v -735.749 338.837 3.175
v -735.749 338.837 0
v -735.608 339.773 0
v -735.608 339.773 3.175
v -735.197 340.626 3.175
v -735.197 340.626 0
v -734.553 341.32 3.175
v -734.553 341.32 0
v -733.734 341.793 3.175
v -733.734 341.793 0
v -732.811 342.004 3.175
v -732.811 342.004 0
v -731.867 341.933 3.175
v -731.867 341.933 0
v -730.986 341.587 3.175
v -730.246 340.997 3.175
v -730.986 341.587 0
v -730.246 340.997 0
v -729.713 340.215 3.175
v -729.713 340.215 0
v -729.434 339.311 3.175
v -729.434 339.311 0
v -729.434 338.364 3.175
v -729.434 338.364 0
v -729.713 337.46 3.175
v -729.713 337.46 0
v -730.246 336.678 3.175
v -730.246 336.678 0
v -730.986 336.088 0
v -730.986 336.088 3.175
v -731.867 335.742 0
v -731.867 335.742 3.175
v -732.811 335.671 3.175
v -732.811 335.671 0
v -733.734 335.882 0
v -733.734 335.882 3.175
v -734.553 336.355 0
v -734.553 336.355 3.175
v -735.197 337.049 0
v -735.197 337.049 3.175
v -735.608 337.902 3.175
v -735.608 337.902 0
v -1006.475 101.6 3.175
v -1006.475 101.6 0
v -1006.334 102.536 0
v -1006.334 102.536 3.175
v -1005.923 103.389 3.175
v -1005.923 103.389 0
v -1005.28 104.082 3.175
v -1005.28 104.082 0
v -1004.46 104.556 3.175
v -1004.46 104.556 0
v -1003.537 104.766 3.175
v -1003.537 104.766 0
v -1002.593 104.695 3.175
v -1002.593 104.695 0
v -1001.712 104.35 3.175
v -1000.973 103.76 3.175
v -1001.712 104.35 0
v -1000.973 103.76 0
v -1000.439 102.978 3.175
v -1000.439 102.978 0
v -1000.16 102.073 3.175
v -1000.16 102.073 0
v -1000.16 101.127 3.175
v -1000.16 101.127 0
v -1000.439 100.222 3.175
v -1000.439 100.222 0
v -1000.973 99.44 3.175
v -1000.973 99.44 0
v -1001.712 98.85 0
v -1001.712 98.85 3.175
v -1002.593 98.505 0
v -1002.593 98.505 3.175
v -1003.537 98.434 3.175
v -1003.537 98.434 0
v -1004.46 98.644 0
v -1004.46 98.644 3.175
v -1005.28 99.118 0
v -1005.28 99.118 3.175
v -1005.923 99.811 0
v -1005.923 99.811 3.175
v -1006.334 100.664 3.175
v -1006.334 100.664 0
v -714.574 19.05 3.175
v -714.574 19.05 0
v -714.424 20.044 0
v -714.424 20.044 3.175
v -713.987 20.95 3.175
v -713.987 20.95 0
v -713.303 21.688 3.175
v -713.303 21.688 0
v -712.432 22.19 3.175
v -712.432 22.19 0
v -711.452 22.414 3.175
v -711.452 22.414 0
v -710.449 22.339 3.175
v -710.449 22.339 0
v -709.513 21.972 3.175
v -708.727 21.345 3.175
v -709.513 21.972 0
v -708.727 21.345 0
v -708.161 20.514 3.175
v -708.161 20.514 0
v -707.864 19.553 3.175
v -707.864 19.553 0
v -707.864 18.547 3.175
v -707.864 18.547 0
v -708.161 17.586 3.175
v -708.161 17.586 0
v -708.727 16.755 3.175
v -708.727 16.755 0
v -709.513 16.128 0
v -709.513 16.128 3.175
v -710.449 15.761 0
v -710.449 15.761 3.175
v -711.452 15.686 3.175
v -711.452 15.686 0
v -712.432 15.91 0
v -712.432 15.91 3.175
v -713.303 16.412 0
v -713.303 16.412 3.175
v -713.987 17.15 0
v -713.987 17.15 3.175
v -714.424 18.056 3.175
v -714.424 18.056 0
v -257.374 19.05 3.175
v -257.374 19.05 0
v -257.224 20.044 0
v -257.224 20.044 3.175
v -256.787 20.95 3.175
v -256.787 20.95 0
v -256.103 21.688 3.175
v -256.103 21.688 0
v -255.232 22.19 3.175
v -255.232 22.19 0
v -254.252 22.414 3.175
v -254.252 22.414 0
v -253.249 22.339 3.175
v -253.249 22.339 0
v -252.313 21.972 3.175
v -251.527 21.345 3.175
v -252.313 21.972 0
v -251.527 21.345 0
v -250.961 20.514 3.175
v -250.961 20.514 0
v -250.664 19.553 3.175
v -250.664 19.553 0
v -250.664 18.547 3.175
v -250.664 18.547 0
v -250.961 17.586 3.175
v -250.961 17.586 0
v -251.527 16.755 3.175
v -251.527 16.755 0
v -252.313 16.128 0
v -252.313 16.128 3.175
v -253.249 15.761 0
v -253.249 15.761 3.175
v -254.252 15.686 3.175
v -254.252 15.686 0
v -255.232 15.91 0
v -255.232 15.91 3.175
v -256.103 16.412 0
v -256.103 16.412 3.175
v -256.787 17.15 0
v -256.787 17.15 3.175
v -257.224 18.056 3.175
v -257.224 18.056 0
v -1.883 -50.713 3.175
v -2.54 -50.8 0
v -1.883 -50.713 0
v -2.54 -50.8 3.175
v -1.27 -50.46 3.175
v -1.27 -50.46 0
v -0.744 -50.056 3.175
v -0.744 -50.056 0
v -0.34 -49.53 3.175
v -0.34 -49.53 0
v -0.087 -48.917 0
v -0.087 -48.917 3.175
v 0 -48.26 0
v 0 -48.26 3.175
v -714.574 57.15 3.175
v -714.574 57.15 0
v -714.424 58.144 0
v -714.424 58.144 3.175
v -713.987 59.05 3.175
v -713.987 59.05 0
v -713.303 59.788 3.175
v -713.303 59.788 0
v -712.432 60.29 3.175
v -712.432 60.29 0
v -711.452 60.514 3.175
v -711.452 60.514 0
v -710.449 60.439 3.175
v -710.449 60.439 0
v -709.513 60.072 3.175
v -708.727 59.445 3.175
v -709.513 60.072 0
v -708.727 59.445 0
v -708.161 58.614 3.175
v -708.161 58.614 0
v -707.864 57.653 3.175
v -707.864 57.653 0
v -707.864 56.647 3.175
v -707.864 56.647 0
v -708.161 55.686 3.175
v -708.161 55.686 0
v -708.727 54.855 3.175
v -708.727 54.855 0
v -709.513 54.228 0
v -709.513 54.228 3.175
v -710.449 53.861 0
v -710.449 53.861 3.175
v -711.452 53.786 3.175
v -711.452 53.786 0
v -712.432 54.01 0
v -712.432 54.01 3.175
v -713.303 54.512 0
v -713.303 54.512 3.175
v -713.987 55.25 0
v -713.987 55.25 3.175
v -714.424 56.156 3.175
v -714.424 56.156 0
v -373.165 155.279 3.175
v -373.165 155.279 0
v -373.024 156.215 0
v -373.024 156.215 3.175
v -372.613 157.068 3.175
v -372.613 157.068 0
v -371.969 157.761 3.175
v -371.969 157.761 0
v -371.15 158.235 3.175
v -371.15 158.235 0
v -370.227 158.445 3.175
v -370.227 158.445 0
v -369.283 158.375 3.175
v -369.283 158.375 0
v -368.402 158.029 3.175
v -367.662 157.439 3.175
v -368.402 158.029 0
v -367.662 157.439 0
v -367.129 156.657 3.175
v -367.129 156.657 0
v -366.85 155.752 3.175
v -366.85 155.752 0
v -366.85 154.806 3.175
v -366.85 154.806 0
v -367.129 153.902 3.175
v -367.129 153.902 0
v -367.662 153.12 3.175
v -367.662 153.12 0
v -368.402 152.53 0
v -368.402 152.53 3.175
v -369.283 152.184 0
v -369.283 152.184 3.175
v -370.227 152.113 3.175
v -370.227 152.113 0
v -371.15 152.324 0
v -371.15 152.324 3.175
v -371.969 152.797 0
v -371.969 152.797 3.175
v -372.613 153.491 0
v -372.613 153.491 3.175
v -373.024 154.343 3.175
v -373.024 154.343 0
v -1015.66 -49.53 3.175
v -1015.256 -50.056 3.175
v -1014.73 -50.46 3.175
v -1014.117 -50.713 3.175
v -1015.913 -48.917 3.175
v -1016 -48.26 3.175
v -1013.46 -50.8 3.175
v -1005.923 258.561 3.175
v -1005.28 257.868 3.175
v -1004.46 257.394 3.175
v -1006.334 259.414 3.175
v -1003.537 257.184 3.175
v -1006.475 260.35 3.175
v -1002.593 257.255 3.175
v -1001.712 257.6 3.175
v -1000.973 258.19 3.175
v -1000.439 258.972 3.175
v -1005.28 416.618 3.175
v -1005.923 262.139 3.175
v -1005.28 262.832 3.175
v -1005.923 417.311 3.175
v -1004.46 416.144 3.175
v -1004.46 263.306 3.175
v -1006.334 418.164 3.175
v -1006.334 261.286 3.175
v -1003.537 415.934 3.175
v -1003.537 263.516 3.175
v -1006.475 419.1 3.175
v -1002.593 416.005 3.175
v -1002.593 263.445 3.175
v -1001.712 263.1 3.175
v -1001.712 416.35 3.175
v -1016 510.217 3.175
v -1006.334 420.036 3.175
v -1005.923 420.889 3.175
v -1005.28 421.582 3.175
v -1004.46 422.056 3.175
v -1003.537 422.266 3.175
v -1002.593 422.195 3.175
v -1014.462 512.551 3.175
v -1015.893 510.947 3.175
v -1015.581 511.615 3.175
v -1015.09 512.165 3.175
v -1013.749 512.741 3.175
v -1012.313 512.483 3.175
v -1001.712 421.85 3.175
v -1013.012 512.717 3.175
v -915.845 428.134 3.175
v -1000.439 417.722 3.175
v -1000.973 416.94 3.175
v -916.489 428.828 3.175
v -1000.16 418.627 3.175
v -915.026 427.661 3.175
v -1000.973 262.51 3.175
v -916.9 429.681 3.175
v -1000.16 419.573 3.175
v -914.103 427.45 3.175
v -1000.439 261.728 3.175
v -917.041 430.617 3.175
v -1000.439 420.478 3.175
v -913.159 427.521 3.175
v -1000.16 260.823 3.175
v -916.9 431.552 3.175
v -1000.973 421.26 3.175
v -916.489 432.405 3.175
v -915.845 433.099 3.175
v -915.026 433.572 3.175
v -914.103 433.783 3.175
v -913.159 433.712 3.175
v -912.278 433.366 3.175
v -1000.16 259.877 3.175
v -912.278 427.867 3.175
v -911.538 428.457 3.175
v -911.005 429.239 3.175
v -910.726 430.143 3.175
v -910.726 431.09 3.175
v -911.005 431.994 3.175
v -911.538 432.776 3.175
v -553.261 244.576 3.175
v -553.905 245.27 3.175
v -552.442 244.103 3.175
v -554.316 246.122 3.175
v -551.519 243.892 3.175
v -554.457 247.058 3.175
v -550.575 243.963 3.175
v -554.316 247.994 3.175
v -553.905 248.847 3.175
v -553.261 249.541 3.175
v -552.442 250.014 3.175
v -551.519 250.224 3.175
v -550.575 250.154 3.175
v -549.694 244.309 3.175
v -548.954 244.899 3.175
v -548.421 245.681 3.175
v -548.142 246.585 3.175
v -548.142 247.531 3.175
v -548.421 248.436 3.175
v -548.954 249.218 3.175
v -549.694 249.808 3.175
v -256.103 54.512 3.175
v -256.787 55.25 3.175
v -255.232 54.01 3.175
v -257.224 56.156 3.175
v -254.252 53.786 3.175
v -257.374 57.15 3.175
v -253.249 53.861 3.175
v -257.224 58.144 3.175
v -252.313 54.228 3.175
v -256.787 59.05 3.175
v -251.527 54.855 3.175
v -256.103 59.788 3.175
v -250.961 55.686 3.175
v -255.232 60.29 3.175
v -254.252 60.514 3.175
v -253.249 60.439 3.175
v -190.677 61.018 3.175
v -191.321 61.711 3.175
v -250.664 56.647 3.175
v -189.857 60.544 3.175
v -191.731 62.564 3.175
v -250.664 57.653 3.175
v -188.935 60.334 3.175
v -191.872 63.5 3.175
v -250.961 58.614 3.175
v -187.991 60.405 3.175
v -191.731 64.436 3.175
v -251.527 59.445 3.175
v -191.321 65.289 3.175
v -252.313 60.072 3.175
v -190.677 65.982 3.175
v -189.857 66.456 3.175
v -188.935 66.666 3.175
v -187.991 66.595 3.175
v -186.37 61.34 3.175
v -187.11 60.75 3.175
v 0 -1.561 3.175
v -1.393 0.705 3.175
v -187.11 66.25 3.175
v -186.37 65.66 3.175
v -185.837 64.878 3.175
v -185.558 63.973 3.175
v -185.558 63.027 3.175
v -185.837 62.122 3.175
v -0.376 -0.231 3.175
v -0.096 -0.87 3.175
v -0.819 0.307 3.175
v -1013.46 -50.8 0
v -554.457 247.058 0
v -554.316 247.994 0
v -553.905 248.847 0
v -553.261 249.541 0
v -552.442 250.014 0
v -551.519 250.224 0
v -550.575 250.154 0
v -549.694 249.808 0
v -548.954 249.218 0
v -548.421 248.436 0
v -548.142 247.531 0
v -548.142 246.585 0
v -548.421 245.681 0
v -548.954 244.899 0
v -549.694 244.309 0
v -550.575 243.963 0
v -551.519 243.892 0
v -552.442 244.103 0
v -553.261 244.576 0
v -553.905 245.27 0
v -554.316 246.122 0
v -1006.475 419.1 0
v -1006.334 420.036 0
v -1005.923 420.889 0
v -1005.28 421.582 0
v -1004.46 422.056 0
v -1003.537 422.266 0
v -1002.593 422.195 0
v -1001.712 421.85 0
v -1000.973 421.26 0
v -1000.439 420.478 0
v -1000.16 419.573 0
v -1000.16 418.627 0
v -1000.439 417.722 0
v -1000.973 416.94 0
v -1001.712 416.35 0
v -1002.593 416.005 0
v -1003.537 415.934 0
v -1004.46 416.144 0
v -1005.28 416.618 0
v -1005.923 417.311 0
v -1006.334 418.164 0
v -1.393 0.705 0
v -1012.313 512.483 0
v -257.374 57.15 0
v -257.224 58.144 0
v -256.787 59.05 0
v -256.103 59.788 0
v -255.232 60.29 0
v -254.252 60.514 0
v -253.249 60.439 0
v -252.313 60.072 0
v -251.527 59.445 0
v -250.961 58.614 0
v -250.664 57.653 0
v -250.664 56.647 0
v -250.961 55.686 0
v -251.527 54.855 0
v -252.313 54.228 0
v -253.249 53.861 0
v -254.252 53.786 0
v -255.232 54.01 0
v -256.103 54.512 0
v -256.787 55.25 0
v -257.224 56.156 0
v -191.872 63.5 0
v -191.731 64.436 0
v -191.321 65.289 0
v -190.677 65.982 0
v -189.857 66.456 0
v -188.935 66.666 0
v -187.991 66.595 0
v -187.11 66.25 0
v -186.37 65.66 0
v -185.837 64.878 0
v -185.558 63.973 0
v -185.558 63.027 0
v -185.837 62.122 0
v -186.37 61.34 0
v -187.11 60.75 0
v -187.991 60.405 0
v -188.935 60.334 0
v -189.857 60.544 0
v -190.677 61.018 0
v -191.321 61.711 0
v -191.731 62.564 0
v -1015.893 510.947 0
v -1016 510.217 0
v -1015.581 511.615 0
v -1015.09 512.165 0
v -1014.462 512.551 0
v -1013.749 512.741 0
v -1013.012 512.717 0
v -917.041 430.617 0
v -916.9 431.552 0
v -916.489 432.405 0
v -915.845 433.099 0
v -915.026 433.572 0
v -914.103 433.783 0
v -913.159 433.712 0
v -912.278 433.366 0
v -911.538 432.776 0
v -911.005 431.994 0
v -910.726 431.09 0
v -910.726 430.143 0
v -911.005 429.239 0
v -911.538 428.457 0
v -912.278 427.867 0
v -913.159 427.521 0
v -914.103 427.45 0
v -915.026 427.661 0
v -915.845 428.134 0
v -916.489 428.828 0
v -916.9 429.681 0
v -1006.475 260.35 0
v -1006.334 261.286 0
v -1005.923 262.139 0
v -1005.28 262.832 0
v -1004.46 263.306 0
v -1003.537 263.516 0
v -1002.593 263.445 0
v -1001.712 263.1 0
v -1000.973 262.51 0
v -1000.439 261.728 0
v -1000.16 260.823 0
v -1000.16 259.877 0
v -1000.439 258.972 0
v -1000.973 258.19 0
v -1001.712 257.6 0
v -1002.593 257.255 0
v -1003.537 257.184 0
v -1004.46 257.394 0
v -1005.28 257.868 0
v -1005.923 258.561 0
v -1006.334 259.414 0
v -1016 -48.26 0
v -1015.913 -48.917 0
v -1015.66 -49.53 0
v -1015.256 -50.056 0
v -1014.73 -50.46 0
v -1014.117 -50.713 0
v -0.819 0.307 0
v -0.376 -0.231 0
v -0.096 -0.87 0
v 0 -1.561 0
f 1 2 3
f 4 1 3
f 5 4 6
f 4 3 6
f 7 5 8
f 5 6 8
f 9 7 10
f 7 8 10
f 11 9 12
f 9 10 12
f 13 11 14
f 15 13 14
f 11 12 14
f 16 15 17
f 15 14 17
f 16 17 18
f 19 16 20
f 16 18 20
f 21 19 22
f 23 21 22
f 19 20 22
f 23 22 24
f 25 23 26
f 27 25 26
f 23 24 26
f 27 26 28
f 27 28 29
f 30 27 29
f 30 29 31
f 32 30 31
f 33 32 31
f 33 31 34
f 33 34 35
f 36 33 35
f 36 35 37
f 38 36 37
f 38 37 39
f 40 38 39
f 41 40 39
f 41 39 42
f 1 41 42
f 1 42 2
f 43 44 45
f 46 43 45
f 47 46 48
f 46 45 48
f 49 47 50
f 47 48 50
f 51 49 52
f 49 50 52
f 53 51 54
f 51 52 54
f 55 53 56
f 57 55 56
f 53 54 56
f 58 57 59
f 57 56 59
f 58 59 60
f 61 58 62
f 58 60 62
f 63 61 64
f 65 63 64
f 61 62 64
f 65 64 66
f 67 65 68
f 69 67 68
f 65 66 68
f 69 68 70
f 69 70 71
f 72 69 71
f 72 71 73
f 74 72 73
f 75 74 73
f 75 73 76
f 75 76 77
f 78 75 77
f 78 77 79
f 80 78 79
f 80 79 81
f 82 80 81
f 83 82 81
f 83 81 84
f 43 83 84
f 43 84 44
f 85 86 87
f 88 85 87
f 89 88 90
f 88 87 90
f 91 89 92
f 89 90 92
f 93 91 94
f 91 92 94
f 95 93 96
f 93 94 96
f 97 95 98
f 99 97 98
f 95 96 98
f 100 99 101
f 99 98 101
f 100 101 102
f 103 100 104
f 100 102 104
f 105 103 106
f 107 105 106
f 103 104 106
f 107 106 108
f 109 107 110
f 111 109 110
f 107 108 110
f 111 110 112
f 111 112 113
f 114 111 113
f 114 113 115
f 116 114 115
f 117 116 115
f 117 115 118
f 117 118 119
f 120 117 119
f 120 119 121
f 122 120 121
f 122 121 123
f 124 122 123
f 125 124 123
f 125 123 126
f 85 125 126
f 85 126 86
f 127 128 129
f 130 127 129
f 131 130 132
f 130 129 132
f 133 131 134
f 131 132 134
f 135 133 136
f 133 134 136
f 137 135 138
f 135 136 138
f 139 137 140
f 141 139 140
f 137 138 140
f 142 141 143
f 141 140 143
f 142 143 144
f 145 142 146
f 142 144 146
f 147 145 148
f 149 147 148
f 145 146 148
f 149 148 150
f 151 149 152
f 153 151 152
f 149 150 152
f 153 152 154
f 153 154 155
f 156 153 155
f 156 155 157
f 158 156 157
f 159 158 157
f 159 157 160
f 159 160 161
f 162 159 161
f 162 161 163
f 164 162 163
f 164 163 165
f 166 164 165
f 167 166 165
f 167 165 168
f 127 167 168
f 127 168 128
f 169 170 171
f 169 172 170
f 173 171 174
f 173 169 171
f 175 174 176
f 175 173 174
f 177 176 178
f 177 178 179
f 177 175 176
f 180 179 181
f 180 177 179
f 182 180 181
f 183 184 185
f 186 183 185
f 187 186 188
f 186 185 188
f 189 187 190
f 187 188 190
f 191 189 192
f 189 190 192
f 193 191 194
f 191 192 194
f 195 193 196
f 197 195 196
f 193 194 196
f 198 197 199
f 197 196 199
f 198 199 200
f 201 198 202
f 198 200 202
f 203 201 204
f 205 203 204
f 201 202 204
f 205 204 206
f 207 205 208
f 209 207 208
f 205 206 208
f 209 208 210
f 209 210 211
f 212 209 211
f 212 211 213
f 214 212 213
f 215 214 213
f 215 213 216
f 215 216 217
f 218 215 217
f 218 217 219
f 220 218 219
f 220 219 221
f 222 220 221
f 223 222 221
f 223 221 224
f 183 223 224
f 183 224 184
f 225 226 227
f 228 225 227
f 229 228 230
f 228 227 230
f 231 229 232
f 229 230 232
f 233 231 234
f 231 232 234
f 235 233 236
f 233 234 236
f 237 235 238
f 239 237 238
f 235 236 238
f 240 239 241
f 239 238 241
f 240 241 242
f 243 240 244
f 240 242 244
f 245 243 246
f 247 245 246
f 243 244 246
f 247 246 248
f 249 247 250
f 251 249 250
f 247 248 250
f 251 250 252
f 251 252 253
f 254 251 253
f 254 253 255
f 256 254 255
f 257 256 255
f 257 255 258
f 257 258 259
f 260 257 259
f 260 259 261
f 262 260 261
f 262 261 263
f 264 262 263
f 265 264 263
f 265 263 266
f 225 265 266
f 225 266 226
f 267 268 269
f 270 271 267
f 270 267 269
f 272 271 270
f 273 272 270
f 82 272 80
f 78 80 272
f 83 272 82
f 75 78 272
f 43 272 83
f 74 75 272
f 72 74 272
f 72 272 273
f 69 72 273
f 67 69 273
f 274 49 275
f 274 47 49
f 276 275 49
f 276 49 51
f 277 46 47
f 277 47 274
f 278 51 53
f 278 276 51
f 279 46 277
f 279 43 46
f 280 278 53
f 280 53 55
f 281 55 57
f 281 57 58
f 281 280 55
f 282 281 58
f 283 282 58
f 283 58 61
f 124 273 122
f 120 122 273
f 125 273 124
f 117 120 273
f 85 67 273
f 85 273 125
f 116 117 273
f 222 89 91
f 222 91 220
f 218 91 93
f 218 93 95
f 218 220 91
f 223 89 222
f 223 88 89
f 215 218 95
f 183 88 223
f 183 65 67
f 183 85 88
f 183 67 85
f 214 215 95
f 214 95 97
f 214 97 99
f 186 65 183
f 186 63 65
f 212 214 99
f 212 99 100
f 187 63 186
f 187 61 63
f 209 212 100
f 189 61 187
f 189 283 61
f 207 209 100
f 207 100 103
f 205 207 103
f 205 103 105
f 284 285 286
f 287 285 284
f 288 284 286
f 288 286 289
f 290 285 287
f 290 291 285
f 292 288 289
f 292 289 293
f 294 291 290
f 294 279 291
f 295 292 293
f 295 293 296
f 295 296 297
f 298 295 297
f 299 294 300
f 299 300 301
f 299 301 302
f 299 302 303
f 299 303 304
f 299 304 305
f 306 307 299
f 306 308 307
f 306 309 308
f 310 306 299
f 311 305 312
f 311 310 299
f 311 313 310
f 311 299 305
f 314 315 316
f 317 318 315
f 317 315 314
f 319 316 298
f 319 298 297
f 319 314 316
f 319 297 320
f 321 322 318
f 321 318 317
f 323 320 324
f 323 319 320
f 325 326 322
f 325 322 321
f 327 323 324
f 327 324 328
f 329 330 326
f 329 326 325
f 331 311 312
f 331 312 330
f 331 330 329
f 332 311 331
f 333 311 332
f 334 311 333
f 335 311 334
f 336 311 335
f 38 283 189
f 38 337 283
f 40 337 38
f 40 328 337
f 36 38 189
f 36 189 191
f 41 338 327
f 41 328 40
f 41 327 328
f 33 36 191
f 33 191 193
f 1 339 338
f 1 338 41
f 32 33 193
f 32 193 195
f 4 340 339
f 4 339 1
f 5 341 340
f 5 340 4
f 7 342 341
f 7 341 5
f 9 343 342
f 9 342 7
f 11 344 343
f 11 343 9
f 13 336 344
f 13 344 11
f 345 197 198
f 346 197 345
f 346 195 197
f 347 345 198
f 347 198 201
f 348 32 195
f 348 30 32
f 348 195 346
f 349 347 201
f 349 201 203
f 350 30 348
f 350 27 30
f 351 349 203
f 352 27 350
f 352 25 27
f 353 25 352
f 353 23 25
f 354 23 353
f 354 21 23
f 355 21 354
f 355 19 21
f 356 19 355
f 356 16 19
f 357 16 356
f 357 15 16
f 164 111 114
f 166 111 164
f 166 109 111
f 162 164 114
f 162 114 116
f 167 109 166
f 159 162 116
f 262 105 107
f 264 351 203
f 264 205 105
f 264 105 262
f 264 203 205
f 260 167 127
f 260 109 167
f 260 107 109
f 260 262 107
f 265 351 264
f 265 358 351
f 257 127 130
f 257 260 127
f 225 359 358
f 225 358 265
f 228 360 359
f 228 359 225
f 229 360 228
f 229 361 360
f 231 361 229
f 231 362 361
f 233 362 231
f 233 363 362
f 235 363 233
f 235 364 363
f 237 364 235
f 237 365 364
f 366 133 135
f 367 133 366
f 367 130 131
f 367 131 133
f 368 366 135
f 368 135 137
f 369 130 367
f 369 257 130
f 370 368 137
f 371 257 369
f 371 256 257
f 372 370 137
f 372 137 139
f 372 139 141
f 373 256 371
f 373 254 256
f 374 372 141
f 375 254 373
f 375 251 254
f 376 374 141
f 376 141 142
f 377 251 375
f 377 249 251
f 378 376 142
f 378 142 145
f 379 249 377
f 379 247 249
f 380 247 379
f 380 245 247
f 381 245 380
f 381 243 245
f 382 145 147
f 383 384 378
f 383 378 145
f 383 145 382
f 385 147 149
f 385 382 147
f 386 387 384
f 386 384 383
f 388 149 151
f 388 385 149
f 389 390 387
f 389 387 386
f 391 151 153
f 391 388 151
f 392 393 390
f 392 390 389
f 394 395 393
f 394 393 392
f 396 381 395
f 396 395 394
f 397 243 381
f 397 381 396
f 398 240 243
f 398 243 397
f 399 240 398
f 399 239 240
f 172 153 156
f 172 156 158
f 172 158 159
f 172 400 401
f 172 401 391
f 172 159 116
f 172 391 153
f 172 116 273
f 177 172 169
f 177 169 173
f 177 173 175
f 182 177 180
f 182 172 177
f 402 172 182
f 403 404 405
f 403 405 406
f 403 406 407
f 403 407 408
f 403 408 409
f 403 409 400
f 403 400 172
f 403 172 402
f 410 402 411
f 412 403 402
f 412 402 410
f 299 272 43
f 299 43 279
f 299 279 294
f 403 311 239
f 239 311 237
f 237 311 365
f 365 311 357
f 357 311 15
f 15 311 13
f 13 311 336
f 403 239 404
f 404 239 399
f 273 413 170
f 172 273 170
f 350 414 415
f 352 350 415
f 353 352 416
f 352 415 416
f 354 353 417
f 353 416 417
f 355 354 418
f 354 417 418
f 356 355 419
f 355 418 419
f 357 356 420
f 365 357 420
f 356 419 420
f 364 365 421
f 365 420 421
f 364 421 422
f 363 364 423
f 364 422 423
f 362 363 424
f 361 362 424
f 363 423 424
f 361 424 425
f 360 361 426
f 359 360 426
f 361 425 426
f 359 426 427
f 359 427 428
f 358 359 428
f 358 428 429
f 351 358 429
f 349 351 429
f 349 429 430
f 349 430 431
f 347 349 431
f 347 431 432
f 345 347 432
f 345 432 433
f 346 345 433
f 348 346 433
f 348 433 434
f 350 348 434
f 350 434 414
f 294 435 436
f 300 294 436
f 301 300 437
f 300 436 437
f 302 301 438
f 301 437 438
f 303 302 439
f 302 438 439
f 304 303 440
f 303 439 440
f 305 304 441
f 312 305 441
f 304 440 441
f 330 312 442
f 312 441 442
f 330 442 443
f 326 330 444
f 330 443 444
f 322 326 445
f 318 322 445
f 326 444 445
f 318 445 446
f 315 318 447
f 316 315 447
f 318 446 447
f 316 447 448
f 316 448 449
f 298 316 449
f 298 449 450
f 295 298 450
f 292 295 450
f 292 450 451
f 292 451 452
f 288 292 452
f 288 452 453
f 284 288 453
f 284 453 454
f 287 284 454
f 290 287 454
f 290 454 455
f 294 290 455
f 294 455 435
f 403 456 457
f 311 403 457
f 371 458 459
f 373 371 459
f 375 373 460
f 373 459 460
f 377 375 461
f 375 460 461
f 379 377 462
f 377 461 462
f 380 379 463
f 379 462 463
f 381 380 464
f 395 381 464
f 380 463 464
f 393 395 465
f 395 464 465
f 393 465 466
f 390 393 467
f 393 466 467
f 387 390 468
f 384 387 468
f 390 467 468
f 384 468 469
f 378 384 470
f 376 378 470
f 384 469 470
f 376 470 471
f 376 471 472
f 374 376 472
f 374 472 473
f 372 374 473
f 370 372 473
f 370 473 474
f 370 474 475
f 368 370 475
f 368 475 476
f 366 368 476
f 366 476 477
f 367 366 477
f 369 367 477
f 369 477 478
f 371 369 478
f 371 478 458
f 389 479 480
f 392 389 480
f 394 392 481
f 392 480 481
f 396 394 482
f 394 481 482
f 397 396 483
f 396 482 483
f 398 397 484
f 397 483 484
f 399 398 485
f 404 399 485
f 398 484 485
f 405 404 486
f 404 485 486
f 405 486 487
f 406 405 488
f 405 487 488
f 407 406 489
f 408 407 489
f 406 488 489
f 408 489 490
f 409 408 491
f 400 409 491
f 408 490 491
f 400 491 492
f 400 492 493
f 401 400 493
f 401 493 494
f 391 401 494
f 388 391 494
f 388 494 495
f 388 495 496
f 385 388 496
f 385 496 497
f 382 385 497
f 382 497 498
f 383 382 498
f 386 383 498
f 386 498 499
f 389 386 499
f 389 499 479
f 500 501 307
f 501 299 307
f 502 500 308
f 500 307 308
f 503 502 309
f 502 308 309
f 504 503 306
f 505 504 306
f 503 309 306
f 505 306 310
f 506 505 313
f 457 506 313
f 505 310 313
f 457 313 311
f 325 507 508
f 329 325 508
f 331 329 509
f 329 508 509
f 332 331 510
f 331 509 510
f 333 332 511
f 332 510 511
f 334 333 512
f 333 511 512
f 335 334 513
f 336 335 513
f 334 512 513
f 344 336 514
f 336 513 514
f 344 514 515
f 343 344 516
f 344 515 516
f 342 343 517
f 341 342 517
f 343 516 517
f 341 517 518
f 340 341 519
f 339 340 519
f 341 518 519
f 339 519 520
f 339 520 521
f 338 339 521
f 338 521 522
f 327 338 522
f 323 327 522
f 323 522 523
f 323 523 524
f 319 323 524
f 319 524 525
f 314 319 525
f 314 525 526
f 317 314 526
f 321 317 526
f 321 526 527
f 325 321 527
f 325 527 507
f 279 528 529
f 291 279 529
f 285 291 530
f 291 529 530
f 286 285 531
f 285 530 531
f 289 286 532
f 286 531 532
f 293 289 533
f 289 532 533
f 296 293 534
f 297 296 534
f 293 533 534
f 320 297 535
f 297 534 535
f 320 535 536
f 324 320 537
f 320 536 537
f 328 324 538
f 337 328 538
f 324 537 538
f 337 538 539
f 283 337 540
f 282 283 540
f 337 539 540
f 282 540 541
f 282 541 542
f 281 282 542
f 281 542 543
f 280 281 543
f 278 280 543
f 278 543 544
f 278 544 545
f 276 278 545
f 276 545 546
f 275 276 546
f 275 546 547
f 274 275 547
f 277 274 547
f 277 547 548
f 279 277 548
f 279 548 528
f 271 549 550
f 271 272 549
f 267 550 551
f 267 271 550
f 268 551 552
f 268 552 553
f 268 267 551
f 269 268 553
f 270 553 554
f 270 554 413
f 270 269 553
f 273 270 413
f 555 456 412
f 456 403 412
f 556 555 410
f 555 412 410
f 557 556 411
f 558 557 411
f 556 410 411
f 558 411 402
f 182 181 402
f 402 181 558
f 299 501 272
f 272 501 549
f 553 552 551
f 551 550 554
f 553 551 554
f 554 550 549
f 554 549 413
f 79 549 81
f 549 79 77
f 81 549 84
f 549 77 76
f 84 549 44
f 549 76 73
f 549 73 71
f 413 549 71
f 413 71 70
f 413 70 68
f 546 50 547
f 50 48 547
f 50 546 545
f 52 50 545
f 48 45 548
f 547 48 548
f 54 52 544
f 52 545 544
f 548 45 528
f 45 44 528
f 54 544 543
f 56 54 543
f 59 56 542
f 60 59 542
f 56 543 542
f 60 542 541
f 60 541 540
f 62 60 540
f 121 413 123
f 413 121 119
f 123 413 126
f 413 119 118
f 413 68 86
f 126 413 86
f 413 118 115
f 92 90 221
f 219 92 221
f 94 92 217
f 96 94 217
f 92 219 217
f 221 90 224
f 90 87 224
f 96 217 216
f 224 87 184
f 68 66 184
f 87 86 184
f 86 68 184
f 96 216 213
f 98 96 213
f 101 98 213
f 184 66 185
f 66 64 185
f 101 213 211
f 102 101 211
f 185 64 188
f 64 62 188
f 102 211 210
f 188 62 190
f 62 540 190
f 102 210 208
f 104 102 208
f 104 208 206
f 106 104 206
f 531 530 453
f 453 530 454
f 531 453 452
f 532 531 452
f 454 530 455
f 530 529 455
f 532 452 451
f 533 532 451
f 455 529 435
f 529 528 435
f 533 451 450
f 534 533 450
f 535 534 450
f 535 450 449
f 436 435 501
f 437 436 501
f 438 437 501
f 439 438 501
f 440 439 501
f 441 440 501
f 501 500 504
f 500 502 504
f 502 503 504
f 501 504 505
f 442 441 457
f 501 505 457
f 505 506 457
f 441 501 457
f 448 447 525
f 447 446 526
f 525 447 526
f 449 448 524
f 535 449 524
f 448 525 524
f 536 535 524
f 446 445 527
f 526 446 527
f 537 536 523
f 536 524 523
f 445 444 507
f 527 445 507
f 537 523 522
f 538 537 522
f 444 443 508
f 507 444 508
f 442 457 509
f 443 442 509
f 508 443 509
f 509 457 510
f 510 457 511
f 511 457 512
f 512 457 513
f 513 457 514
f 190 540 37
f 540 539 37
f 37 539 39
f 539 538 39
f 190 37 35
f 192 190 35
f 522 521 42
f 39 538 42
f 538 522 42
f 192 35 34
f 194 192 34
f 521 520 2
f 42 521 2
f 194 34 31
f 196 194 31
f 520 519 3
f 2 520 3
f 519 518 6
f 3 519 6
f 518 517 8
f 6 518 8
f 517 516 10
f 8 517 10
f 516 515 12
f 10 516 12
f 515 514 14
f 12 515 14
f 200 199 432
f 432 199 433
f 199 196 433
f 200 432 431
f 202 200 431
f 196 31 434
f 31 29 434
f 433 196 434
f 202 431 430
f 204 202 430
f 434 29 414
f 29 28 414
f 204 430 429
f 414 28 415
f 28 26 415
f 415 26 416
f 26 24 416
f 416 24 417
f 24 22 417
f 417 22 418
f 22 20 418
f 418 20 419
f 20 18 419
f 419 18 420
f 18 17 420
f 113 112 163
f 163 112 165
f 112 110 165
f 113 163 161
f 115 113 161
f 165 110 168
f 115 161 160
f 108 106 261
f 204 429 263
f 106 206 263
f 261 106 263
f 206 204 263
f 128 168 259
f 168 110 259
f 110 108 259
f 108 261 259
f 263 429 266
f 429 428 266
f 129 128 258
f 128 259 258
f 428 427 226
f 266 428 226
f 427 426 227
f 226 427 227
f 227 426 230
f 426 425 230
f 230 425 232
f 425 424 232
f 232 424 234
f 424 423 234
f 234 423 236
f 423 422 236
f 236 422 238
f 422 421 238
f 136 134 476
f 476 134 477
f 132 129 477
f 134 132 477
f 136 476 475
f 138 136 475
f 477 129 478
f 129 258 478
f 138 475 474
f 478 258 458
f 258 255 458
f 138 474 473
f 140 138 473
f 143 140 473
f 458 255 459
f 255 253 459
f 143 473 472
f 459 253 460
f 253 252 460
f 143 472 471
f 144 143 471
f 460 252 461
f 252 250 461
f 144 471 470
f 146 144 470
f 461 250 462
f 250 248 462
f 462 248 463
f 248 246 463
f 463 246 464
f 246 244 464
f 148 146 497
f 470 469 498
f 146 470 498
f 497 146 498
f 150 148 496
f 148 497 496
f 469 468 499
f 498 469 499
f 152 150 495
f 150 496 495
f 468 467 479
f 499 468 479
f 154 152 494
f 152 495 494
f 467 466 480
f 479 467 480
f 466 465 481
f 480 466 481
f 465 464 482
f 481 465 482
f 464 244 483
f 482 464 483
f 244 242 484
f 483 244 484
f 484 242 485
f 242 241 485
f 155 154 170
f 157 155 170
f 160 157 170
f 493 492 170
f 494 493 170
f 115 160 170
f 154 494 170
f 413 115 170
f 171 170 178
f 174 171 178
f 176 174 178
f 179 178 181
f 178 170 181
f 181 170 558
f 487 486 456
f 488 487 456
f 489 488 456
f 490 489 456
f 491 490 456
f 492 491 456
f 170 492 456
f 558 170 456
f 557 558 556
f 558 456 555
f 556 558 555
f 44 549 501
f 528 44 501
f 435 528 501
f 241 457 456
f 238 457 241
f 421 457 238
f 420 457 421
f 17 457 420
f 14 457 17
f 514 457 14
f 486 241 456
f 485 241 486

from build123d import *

# Parameters (mm, degrees)
BOSS_EXTRUDE1_DEPTH              = 3.175
F_1_4_0_25_DIAMETER_HOLE1_D      = 6.35
F_17_64_0_26563_DIAMETER_HOLE1_D = 6.747002
FILLET1_R                        = 2.54
F_1_4_0_25_DIAMETER_HOLE2_D      = 6.35


with BuildPart() as part:
    # Sketch1 → Boss-Extrude1 (new body)
    with BuildSketch(Plane.XY):
        Polygon((-1016, 514.35), (-1016, -50.8), (0, -50.8), (0, 0), align=None)
    extrude(amount=BOSS_EXTRUDE1_DEPTH)

    # 1/4 (0.25) Diameter Hole1 (through all)
    with Locations(Plane.XY.offset(3.175)):
        with Locations((-1003.3, 419.1), (-1003.3, 260.35), (-1003.3, 101.6)):
            Hole(F_1_4_0_25_DIAMETER_HOLE1_D / 2)

    # 17/64 (0.26563) Diameter Hole1 (through all)
    with Locations(Plane.XY.offset(3.175)):
        with Locations((-254, 19.05), (-711.2, 57.15), (-711.2, 19.05), (-254, 57.15)):
            Hole(F_17_64_0_26563_DIAMETER_HOLE1_D / 2)

    # Fillet1
    fillet1_edges = [part.edges().sort_by_distance(p)[0] for p in [
        (0, 0, 1.5875),
        (0, -50.8, 1.5875),
        (-1016, -50.8, 1.5875),
        (-1016, 514.35, 1.5875),
    ]]
    fillet(fillet1_edges, radius=FILLET1_R)

    # 1/4 (0.25) Diameter Hole2 (through all)
    with Locations(Plane.XY.offset(3.175)):
        with Locations((-913.865917768, 430.616531739), (-732.573803329, 338.837398804), (-188.697460012, 63.5), (-369.989574451, 155.279132935), (-551.28168889, 247.058265869)):
            Hole(F_1_4_0_25_DIAMETER_HOLE2_D / 2)


solid = part.part
